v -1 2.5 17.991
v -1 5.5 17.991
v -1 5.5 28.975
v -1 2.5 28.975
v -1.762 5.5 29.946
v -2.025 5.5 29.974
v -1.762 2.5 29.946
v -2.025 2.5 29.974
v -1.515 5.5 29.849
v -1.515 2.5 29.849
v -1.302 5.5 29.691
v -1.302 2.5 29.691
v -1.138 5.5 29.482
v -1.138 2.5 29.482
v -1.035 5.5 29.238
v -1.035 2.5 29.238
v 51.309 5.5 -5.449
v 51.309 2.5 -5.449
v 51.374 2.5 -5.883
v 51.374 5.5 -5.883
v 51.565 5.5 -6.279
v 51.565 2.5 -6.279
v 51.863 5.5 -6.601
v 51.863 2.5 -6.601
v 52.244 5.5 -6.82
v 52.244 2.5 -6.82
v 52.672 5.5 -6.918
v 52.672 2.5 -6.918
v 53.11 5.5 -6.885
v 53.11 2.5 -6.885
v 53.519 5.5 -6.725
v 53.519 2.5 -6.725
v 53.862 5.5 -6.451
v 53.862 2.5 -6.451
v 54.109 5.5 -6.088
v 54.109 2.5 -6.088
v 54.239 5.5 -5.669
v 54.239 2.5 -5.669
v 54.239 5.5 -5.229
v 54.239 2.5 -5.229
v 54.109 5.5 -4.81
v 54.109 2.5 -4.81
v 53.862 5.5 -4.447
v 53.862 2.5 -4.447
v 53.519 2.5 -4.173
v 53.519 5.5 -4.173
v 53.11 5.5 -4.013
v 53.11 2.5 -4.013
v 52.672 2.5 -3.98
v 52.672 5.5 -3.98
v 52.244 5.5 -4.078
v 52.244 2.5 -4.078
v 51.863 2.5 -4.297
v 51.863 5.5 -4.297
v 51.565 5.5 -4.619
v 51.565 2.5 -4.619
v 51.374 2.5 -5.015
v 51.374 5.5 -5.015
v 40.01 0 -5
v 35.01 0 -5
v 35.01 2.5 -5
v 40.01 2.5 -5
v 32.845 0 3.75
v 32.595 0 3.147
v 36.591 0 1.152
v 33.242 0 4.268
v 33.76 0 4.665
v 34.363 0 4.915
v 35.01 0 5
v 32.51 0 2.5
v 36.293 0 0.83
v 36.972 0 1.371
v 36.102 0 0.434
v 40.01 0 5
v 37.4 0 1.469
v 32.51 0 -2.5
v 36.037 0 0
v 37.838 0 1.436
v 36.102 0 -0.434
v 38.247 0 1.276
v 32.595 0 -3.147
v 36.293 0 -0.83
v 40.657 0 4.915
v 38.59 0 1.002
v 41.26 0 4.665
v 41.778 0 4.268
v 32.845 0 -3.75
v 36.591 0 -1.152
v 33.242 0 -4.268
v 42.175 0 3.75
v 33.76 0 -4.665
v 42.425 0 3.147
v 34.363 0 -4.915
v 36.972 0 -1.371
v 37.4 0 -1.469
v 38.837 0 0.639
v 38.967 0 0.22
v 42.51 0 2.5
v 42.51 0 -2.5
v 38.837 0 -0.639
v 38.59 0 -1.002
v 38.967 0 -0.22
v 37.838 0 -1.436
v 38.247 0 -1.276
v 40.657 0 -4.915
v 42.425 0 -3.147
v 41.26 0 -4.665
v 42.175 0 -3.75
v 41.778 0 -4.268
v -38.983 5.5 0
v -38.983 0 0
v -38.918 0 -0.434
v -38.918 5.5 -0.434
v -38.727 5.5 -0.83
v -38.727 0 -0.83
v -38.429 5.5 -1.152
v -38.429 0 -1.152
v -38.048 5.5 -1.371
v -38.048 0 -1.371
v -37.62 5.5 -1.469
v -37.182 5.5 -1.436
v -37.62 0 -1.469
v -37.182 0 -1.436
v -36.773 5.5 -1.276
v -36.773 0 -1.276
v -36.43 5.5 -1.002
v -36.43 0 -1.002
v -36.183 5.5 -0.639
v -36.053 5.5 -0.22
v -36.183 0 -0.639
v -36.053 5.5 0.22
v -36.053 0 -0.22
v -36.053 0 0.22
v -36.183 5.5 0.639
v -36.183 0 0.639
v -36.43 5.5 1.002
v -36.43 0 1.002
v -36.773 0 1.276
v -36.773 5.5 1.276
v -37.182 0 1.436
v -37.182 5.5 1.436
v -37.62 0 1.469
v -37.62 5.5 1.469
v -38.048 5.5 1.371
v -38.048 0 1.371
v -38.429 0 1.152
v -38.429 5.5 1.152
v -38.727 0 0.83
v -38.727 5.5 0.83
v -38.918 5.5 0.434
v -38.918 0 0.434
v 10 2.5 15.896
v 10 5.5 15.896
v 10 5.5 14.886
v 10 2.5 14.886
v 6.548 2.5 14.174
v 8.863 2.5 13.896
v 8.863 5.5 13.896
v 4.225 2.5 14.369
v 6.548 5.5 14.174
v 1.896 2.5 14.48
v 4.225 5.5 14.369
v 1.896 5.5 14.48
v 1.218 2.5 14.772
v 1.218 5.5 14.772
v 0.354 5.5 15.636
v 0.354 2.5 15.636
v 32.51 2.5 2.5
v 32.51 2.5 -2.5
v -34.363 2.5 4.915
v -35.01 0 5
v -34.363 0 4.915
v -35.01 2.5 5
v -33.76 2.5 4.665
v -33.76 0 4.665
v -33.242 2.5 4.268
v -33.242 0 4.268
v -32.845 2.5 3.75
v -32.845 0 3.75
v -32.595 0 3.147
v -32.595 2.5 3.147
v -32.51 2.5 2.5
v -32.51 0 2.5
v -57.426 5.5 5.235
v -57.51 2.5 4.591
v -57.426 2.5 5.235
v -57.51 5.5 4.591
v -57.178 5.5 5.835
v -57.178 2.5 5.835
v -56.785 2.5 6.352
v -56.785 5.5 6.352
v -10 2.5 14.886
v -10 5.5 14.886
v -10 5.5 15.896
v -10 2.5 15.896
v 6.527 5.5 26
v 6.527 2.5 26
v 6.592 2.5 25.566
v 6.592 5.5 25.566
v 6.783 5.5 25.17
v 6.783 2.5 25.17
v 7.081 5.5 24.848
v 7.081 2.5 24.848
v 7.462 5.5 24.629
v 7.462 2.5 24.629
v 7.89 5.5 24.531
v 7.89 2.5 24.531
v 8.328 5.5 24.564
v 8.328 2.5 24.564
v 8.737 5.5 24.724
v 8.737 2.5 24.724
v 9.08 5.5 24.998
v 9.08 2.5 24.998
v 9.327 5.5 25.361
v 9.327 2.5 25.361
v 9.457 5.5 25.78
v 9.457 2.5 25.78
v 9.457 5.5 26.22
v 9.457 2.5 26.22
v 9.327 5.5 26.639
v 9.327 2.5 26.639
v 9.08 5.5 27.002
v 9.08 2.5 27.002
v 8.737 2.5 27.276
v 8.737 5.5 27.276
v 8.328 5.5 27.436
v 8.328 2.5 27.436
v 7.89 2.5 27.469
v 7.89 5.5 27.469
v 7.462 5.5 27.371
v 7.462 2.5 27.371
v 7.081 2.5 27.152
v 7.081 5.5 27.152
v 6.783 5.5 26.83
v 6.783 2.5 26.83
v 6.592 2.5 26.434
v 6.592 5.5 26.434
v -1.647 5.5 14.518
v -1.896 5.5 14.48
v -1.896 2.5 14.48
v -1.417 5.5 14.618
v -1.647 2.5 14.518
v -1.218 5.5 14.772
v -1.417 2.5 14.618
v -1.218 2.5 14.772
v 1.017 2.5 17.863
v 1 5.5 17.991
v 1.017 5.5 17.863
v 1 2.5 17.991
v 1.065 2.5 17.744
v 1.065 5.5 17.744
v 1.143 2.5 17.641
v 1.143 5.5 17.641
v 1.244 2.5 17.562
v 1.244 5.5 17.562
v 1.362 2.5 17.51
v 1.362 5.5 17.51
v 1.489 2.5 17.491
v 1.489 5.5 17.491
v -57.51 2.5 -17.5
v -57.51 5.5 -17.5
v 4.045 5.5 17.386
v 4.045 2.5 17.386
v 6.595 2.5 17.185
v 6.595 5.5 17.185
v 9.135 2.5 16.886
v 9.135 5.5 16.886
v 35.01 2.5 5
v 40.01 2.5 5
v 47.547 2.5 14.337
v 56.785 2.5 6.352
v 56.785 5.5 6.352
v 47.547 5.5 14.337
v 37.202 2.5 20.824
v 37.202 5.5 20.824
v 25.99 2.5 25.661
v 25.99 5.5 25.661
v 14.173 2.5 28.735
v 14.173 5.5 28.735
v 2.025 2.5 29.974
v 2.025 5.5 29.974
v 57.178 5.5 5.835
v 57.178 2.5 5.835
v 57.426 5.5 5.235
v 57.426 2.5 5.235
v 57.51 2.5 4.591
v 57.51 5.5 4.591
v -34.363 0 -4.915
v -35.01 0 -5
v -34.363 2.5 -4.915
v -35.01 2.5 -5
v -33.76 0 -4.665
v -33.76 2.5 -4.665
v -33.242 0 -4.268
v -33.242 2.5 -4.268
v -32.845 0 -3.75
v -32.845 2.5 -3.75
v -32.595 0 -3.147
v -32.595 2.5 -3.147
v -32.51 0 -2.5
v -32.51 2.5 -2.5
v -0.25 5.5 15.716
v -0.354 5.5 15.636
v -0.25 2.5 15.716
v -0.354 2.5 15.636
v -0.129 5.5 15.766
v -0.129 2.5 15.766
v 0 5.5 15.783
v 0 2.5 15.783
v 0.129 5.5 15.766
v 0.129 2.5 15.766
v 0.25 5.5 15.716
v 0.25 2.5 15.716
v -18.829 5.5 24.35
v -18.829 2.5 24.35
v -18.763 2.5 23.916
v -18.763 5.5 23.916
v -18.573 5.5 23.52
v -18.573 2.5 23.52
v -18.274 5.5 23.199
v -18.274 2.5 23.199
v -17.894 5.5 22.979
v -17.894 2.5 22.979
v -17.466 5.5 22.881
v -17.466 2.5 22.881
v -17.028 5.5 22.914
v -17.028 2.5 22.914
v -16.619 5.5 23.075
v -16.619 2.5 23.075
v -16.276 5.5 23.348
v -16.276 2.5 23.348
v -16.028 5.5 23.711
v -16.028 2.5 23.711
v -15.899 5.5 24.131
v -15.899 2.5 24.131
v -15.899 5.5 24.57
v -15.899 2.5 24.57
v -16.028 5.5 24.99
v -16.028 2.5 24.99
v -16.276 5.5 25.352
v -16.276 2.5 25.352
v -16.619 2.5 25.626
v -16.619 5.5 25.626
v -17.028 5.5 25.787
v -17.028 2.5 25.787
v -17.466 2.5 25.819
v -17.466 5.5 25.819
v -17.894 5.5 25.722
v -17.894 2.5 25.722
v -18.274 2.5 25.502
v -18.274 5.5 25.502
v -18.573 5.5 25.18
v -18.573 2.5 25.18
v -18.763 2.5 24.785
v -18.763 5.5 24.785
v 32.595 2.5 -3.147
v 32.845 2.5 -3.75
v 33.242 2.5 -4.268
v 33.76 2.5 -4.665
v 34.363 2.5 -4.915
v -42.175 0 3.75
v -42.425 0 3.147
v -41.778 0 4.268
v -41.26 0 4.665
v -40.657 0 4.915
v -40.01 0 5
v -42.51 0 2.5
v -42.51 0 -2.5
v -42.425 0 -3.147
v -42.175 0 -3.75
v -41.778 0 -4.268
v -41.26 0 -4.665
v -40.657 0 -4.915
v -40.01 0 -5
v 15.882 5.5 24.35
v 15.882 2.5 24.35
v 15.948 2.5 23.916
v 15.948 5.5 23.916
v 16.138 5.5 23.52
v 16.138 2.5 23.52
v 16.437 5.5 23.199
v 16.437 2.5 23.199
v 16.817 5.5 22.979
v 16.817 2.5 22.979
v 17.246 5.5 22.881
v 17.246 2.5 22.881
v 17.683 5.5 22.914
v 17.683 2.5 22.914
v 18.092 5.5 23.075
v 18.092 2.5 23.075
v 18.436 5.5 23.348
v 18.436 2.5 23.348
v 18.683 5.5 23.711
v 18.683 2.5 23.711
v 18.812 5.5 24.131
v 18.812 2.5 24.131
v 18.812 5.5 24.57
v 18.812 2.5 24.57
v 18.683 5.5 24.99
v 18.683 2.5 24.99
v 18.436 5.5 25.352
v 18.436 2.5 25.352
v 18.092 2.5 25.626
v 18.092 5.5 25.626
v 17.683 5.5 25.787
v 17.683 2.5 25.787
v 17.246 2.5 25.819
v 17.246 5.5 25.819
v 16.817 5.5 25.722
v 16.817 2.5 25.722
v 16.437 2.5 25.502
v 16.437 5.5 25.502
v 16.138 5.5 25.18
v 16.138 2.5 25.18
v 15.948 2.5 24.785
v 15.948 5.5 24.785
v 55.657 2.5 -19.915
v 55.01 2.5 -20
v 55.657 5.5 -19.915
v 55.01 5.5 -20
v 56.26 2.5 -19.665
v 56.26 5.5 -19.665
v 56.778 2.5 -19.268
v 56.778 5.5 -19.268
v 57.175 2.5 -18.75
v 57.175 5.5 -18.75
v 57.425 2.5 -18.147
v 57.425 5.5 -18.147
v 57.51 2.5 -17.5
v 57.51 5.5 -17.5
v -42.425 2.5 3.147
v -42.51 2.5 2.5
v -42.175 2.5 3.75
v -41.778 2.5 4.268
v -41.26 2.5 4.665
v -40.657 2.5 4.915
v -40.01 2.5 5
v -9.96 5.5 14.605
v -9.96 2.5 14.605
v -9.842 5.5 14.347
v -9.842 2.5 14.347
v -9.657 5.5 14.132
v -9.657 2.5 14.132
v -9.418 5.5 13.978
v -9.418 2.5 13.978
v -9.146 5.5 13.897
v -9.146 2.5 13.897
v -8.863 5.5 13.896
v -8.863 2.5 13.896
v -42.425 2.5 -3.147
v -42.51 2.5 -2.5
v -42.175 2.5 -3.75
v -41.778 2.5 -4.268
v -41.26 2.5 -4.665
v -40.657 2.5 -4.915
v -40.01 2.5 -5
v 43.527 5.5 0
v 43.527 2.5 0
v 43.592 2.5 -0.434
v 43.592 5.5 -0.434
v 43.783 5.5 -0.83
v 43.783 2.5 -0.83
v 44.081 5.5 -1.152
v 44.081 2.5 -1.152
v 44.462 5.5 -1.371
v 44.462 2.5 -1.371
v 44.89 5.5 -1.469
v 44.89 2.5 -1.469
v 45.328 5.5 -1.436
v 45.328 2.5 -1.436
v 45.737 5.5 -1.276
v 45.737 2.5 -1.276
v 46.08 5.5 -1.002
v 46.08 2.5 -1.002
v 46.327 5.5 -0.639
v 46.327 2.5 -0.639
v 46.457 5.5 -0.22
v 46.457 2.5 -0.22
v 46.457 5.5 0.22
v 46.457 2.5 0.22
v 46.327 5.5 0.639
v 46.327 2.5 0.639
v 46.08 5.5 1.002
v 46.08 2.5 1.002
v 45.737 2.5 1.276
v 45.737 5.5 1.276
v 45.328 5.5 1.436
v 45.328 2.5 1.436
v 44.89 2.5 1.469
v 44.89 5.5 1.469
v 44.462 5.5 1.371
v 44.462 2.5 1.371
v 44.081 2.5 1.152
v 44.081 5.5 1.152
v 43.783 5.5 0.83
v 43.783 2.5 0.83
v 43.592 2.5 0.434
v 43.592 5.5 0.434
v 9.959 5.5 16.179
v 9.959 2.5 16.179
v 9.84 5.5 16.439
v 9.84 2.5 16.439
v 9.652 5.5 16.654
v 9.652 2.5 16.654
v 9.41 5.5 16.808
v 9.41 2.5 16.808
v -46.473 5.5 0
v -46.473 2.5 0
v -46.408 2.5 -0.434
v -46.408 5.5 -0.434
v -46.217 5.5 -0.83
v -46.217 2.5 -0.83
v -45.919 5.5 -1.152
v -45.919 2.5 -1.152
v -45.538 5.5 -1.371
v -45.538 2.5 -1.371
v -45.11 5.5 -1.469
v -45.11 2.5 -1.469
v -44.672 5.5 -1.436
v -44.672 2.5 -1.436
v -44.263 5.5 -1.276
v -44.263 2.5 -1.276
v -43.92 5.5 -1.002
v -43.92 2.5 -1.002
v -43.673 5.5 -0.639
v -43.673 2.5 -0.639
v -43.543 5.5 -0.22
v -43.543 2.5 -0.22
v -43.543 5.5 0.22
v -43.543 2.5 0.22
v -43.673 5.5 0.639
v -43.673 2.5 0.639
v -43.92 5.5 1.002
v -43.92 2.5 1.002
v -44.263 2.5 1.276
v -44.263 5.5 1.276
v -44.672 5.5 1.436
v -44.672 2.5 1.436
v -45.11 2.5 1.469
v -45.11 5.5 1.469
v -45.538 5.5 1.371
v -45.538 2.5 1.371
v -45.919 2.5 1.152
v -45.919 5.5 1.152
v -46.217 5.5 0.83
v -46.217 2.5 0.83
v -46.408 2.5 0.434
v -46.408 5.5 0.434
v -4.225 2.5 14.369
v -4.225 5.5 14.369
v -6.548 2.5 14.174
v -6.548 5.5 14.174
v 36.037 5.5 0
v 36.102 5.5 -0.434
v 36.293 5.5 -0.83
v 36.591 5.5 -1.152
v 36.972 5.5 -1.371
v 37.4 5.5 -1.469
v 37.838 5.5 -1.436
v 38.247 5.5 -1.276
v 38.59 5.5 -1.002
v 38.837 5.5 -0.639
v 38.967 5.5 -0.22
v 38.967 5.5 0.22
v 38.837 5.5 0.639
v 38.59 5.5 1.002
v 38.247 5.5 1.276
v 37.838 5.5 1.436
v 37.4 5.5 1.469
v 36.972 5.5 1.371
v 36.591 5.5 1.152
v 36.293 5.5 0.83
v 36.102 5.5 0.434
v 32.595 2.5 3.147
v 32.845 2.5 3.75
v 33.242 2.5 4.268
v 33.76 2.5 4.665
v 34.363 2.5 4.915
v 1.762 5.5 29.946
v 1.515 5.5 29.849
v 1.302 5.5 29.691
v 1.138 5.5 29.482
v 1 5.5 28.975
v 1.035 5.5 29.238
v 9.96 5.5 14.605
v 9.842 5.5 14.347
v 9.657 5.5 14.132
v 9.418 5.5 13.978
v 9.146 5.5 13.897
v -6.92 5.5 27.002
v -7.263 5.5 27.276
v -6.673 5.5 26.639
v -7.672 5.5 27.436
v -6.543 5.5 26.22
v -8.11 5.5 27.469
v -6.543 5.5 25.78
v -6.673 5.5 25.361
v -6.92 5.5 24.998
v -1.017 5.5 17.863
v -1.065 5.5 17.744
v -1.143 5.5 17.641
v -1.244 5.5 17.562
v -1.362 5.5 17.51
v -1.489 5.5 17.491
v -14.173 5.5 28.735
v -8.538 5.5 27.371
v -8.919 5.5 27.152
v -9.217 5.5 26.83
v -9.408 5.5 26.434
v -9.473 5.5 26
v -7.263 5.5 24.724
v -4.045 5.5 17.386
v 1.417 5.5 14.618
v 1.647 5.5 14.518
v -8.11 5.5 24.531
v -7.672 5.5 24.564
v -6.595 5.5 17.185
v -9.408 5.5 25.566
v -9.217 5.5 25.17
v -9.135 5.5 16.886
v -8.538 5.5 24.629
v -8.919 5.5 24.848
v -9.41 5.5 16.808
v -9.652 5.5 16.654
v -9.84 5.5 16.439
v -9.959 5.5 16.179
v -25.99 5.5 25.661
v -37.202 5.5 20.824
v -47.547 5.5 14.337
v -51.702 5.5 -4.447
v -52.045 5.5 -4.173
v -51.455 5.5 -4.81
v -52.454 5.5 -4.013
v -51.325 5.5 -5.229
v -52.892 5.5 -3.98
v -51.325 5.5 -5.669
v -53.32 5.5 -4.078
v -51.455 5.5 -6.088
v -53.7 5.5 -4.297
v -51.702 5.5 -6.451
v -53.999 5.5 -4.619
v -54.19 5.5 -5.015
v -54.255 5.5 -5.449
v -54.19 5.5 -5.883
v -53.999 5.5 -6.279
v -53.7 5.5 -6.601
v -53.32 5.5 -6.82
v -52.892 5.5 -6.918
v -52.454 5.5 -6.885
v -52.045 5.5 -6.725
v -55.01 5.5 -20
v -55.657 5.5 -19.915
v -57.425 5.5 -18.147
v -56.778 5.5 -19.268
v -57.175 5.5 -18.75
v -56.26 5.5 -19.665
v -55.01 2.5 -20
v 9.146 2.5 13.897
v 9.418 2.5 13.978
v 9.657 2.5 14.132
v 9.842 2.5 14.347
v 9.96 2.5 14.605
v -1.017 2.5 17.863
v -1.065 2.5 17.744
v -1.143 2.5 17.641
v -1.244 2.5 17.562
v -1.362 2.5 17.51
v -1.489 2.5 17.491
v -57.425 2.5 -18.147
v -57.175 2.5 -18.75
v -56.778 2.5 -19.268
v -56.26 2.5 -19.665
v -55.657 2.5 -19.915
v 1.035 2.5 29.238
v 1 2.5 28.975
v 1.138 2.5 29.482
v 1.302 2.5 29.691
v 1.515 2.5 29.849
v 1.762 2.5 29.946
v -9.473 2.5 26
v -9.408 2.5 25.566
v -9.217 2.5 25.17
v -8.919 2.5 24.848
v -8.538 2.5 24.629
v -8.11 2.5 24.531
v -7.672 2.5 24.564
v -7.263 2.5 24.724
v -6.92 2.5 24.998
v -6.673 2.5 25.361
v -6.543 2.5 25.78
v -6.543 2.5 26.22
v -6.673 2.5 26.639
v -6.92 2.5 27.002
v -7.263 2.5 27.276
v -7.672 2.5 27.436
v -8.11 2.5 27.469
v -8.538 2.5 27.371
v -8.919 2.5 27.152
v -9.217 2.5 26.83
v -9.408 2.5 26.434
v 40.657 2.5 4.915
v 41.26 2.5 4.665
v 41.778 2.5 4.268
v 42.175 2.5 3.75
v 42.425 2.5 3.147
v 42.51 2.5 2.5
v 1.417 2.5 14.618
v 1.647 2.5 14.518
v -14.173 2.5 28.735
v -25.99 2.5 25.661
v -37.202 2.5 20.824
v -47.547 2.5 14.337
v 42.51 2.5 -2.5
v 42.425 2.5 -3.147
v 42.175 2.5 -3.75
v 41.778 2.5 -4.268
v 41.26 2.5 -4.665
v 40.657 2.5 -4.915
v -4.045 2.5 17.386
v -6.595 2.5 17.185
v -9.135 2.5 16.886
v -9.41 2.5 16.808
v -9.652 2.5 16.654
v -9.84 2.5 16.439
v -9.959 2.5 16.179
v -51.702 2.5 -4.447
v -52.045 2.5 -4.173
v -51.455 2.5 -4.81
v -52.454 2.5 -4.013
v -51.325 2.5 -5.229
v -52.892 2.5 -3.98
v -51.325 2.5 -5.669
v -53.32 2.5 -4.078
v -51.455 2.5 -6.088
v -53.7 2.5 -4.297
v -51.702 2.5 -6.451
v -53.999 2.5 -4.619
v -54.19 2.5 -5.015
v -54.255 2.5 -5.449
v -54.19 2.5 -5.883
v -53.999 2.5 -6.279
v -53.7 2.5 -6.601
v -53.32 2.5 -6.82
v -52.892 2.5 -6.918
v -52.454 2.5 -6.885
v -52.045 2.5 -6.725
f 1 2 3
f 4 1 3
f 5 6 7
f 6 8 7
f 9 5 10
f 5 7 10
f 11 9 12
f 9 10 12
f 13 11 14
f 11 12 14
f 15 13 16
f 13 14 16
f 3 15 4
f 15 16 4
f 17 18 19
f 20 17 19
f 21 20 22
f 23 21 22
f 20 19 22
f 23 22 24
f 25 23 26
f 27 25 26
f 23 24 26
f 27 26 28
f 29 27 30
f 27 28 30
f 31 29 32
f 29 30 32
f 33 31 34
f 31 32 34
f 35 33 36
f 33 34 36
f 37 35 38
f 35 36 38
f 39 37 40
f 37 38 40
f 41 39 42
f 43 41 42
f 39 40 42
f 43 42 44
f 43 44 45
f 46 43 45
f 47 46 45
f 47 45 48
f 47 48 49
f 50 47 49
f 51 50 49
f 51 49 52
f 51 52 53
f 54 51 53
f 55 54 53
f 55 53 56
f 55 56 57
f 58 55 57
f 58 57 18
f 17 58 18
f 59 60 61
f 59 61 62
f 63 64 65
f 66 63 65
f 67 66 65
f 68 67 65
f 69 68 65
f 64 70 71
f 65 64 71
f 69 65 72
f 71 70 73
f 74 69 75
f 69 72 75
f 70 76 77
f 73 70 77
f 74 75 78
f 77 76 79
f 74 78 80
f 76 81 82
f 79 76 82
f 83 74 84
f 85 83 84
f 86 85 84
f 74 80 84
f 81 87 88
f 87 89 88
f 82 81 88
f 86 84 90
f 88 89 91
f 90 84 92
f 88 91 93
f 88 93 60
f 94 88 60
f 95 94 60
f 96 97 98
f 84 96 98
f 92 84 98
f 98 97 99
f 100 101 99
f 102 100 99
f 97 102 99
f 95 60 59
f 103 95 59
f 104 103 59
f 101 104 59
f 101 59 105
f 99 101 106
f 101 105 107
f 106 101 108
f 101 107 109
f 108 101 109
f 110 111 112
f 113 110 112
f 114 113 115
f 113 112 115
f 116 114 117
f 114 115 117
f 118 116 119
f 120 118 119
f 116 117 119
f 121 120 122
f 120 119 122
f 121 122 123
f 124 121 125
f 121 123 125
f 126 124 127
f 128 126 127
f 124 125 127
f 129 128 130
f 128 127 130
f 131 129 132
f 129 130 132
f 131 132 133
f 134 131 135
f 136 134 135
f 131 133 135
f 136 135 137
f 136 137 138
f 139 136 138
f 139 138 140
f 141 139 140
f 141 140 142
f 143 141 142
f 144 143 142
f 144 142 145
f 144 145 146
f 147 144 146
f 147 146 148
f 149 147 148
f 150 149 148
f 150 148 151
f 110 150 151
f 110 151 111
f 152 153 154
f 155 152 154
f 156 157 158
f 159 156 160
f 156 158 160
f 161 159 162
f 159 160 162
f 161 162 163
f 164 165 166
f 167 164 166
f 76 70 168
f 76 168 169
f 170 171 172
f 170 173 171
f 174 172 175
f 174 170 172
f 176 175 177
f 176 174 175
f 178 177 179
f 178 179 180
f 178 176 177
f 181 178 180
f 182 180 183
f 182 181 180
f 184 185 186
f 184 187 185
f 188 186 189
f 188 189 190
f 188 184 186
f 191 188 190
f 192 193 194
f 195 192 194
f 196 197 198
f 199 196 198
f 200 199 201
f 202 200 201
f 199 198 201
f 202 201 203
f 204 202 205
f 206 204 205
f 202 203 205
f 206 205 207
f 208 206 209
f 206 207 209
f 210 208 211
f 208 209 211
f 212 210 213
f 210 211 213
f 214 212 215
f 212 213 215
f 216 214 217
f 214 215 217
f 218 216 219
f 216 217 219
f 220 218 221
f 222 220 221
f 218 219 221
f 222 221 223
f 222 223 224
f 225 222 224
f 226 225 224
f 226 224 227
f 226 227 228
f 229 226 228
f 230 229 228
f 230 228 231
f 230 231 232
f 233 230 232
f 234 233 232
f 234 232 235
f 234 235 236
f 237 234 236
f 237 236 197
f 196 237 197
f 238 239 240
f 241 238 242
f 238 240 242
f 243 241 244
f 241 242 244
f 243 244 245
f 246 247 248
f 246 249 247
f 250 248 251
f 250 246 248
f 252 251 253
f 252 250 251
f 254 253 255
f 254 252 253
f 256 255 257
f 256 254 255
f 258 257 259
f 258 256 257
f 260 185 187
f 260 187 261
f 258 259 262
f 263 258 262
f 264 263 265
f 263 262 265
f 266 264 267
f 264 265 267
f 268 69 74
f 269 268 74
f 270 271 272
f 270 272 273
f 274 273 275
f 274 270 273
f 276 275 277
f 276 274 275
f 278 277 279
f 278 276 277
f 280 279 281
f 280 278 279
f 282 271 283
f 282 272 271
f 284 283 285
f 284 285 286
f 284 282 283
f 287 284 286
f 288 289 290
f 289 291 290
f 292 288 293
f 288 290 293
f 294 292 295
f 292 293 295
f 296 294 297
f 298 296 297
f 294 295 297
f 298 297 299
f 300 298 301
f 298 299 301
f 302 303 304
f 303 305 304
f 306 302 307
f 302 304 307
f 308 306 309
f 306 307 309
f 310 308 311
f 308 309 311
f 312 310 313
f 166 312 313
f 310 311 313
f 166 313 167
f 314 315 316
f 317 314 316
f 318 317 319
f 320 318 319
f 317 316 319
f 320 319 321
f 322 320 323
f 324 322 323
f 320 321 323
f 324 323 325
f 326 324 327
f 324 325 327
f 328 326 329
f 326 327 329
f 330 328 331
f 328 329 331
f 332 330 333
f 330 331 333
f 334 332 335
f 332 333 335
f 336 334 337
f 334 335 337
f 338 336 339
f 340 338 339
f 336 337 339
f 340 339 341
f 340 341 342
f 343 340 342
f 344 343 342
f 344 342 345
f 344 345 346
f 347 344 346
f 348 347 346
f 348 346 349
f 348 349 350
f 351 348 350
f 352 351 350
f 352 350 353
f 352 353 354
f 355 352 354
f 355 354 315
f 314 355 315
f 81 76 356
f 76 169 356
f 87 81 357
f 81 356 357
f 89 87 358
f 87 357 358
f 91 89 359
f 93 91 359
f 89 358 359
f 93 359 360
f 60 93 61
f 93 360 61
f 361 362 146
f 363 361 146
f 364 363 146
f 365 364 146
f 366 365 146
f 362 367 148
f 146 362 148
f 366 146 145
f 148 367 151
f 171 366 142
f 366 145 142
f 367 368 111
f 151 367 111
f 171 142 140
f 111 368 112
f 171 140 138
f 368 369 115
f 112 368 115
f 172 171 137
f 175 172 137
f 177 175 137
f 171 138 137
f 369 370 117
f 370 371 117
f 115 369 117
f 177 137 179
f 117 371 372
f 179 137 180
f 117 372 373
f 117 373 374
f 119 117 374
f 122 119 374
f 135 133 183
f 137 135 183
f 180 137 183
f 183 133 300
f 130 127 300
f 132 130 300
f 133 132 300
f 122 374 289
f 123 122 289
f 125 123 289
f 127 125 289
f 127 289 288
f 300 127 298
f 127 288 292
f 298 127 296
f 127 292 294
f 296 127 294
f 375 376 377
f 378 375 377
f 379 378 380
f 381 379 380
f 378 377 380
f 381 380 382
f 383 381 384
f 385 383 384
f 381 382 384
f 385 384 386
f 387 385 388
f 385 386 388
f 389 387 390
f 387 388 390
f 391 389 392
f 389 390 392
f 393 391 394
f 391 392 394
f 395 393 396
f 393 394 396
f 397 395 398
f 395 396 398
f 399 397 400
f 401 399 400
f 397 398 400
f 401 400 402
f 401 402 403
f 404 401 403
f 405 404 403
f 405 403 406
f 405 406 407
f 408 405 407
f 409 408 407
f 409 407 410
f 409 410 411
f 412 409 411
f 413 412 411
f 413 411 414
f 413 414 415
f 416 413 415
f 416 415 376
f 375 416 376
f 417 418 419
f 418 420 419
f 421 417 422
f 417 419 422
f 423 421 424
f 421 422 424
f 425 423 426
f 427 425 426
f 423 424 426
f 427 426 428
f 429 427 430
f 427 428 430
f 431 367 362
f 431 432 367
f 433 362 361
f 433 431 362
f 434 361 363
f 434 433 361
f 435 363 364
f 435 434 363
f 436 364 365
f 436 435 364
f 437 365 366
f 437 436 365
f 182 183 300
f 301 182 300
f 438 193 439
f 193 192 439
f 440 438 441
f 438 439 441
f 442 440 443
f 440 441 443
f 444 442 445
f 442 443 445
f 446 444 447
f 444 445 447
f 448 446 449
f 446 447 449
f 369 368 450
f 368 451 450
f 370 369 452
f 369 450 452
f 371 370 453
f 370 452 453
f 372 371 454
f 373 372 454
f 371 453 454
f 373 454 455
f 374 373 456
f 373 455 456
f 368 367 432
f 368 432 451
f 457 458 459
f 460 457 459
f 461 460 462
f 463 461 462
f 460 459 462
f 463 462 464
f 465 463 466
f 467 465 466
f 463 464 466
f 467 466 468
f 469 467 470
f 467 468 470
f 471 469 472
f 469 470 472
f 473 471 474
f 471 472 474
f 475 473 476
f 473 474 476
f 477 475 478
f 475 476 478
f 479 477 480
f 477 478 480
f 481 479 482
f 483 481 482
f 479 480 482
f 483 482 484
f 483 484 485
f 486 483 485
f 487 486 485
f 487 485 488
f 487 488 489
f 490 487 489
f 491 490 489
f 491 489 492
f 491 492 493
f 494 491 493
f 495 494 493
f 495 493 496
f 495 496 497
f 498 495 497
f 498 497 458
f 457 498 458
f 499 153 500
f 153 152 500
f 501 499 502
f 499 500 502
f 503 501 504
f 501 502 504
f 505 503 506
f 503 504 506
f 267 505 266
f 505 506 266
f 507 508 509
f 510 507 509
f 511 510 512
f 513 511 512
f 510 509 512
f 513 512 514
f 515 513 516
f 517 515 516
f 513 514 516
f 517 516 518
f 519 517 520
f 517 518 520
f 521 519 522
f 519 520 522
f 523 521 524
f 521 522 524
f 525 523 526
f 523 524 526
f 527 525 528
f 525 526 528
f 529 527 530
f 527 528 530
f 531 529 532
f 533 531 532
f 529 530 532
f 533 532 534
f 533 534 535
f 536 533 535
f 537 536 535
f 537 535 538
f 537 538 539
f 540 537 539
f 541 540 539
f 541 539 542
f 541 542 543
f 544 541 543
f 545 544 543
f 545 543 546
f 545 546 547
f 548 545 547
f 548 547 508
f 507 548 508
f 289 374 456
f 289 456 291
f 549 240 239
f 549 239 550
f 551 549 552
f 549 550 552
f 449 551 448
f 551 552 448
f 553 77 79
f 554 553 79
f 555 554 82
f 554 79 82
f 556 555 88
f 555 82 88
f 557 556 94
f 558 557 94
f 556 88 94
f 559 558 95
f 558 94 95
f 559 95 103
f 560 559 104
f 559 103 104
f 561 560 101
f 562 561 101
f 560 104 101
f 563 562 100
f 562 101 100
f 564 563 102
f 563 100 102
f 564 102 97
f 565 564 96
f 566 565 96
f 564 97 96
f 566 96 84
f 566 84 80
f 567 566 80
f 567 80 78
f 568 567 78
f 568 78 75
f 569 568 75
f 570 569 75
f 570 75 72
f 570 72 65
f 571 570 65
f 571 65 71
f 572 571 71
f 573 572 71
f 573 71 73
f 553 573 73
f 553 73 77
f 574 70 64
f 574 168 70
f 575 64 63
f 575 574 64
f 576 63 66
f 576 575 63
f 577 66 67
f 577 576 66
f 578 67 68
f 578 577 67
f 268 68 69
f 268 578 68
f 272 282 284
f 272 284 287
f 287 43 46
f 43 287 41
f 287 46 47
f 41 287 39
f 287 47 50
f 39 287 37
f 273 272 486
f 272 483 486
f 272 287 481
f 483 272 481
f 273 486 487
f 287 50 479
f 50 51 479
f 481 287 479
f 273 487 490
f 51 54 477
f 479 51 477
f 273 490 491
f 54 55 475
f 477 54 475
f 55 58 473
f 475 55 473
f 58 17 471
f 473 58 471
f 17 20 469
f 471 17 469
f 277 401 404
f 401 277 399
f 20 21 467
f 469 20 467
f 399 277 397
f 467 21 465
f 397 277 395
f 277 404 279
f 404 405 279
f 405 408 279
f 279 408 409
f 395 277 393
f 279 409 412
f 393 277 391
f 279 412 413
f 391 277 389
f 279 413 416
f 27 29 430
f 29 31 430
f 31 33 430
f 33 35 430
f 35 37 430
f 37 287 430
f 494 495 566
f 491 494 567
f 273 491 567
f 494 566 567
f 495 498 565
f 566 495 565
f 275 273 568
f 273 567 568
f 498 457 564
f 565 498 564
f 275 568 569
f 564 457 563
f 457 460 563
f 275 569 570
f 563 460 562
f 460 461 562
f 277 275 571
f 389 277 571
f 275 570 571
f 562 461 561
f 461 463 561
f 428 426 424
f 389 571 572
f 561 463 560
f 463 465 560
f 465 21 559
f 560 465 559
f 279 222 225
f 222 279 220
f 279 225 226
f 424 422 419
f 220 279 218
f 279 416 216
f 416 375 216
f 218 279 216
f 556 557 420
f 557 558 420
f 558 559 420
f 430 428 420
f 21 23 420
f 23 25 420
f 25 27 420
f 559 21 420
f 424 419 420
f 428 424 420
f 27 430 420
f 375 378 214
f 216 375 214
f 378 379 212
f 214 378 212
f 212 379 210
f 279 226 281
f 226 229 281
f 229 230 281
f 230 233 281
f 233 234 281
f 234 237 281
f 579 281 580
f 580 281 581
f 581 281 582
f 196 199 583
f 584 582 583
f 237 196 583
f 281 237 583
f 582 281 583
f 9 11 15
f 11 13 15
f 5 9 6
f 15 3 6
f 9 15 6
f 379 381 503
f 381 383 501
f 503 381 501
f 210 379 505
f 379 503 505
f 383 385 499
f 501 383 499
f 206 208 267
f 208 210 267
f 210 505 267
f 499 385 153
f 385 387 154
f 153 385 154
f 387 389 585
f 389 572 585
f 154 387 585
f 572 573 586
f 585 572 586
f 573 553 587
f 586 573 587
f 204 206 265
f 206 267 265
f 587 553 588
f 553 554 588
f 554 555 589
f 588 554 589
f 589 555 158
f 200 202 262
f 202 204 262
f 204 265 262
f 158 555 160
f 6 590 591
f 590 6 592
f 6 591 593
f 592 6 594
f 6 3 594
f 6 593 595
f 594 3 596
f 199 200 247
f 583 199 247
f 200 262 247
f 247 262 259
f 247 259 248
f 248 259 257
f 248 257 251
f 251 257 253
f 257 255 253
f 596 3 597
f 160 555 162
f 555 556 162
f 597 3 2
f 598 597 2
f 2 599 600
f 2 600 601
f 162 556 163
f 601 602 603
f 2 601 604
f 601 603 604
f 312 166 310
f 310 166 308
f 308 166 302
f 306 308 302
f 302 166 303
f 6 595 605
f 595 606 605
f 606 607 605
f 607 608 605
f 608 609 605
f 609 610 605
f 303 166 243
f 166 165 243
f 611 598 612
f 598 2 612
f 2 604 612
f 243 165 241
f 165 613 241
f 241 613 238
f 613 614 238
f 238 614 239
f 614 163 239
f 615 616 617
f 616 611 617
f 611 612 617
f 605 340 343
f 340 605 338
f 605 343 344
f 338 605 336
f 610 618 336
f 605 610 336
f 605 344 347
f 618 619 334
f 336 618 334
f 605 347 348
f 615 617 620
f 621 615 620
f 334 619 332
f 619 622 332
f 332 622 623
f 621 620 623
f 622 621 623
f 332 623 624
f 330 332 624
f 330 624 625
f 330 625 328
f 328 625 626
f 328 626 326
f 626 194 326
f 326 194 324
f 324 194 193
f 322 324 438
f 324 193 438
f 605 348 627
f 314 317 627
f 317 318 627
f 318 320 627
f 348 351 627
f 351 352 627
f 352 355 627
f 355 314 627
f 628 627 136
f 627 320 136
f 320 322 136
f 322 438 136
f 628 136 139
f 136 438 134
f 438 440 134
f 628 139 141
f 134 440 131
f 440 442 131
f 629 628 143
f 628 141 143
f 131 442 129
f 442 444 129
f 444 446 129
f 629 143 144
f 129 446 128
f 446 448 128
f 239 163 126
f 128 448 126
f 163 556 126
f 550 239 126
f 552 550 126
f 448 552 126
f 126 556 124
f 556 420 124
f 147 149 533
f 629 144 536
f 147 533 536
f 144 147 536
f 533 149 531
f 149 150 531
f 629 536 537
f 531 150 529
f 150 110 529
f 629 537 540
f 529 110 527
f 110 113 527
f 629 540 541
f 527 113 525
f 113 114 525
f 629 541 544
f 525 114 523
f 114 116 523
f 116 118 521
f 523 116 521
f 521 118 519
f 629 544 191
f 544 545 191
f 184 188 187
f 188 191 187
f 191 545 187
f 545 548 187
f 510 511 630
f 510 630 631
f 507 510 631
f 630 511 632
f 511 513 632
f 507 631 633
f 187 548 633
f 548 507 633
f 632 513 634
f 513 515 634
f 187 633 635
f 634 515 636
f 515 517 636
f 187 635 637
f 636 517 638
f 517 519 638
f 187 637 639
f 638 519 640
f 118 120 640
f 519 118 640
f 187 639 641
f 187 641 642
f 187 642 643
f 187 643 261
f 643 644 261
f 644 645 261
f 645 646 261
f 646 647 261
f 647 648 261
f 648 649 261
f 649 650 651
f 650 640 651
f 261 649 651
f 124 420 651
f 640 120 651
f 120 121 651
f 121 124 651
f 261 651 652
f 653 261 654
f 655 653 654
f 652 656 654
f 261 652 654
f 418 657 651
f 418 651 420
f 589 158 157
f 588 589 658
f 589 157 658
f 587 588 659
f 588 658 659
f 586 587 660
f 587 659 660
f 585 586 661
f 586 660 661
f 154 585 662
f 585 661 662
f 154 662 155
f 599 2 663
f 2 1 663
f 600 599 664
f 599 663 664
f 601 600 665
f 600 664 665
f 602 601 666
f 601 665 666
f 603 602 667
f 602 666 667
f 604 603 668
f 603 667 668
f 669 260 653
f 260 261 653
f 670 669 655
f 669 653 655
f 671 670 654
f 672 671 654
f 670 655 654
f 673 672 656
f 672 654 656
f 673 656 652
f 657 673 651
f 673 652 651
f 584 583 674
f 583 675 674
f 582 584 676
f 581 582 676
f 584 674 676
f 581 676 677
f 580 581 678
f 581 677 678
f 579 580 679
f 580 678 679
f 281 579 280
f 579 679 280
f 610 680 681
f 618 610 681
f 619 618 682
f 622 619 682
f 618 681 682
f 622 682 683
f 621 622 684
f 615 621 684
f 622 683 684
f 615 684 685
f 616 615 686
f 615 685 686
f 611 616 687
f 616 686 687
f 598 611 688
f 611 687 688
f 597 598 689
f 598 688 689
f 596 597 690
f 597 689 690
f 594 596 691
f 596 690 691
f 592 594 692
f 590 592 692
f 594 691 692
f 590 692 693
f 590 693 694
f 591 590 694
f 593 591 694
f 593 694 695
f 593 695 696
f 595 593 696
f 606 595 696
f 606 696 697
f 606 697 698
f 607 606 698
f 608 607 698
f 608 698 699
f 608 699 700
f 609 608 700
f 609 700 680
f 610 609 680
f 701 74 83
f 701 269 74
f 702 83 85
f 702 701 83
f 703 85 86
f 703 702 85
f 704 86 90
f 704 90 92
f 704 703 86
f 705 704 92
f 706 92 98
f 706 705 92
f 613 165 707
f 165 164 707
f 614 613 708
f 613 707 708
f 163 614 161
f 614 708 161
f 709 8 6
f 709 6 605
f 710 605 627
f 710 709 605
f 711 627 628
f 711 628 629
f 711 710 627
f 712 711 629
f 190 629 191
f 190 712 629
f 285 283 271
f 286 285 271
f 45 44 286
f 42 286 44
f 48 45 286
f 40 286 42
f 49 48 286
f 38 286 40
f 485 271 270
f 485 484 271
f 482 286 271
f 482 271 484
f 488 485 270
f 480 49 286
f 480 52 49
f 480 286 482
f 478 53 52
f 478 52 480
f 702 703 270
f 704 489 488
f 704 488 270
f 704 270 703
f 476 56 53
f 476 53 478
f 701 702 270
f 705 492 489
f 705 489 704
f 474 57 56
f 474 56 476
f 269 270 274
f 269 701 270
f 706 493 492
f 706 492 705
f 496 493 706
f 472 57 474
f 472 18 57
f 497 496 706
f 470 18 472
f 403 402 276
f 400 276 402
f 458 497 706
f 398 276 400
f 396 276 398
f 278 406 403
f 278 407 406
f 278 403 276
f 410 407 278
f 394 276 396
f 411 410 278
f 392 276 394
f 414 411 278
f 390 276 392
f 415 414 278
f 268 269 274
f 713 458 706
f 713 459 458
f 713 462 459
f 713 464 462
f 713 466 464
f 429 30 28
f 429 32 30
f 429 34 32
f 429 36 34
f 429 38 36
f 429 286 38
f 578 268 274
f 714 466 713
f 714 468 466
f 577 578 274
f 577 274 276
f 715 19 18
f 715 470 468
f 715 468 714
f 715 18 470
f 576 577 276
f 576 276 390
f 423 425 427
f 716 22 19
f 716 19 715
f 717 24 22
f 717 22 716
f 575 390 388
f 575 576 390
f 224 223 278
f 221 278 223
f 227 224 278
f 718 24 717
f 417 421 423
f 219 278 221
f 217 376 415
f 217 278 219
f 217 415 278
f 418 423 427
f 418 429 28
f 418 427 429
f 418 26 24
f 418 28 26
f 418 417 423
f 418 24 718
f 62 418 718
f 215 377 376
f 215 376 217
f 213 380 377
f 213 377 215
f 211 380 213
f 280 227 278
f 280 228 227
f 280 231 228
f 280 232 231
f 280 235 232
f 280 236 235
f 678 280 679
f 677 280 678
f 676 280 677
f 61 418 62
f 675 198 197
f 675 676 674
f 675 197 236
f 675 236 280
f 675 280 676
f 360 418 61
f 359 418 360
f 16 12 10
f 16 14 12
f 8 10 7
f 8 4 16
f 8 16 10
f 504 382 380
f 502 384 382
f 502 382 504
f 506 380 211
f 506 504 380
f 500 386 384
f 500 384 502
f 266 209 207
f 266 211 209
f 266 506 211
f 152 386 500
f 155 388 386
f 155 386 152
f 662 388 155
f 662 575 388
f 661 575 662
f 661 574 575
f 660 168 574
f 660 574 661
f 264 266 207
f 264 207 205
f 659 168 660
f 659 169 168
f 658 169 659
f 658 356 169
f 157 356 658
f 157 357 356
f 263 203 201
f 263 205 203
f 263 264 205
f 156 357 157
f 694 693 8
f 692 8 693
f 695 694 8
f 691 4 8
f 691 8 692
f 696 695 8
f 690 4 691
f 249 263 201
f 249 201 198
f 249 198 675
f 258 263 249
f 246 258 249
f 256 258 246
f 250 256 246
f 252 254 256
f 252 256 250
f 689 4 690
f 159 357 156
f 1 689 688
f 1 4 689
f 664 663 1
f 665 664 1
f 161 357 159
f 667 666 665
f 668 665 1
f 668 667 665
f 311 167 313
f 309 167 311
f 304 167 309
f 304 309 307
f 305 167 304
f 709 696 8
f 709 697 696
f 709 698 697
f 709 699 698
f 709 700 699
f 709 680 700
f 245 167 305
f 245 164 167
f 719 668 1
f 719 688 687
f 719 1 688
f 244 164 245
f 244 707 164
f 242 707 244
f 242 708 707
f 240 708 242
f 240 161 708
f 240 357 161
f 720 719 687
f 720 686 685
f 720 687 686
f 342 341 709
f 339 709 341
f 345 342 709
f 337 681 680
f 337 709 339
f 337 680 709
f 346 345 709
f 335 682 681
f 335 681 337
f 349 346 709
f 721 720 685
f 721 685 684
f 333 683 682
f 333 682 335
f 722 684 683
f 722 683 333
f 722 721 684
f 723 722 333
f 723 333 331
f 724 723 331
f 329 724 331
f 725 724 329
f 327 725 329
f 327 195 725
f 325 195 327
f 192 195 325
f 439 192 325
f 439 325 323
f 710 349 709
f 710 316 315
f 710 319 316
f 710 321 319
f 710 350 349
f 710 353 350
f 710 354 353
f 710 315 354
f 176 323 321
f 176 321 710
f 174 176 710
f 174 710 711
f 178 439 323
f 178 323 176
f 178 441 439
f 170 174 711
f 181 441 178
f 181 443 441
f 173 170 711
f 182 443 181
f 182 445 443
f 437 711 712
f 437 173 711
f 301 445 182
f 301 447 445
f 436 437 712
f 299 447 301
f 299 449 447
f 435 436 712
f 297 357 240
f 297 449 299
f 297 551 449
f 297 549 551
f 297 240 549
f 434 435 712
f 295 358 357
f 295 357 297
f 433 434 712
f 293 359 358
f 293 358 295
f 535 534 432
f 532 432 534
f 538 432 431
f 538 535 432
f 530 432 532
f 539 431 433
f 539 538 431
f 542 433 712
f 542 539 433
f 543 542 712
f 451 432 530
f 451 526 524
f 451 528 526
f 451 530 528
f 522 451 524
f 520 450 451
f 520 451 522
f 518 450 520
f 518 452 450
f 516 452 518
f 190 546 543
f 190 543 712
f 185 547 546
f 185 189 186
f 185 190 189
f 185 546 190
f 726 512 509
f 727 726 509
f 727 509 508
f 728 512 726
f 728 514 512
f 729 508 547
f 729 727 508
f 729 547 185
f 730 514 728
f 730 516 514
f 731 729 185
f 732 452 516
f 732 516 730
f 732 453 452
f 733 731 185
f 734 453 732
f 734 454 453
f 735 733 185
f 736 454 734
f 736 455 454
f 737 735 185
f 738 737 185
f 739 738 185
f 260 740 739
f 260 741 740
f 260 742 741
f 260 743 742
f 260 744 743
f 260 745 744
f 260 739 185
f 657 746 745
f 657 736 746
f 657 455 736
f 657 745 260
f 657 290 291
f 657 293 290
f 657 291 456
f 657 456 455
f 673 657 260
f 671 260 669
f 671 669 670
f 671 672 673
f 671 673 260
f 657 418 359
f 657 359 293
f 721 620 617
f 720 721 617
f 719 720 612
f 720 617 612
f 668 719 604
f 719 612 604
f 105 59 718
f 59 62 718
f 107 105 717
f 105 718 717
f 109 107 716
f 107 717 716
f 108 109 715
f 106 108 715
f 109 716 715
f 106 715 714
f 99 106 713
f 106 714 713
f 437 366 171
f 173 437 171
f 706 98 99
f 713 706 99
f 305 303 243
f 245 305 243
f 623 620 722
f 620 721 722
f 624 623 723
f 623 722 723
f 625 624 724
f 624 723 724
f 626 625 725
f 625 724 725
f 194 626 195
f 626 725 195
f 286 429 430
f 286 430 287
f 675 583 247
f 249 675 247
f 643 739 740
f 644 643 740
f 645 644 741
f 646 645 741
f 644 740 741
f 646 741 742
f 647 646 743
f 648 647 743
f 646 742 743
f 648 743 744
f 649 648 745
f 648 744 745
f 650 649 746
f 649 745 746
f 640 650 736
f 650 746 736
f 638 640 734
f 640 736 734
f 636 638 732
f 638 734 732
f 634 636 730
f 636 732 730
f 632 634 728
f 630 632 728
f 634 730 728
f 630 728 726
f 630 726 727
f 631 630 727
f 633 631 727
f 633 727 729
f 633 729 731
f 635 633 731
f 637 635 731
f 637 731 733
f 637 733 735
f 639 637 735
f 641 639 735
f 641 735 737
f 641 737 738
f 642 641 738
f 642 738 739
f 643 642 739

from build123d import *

# Parameters (mm, degrees)
SKETCH1_W             = 10
SKETCH1_H             = 10
BOSS_EXTRUDE1_DEPTH   = 2.5
BOSS_EXTRUDE1_2_DEPTH = 2.5
BOSS_EXTRUDE2_DEPTH   = 3
F_2_CLEARANCE_HOLE1_D = 2.9464
FILLET1_R             = 2.5
F_2_CLEARANCE_HOLE2_D = 2.9464
CUT_EXTRUDE1_DEPTH    = 66.097235732
FILLET2_R             = 1
FILLET3_R             = 0.5


with BuildPart() as part:
    # Sketch1 → Boss-Extrude1 (new body)
    with BuildSketch(Plane(origin=(0, 0, 0), x_dir=(1, 0, 0), z_dir=(0, 1, 0))):
        with Locations((-37.51, 0)):
            Rectangle(SKETCH1_W, SKETCH1_H)
    extrude(amount=BOSS_EXTRUDE1_DEPTH)



with BuildPart() as body_2:
    # Sketch1 → Boss-Extrude1 2 (new body)
    with BuildSketch(Plane(origin=(0, 0, 0), x_dir=(1, 0, 0), z_dir=(0, 1, 0))):
        with Locations((37.51, 0)):
            Rectangle(SKETCH1_W, SKETCH1_H)
    extrude(amount=BOSS_EXTRUDE1_2_DEPTH)


with BuildPart() as part_1:
    add(part.part)

    add(body_2.part)  # Boss-Extrude2 merges body 2
    # Sketch2 → Boss-Extrude2 (add)
    with BuildSketch(Plane(origin=(0, 2.5, 0), x_dir=(1, 0, 0), z_dir=(0, 1, 0))):
        with BuildLine():
            Line((-57.51, -5.611149062), (-57.51, 20))
            Line((-57.51, 20), (57.51, 20))
            Line((57.51, 20), (57.51, -5.611149062))
            ThreePointArc((57.51, -5.611149062), (0, -30), (-57.51, -5.611149062))
        make_face()
    extrude(amount=BOSS_EXTRUDE2_DEPTH)

    # #2 Clearance Hole1 (through all)
    with Locations(Plane(origin=(0, 5.5, 0), x_dir=(1, 0, 0), z_dir=(0, 1, 0))):
        with Locations((17.355673654, -24.350342312), (-17.355673654, -24.350342312), (-8, -26), (-52.781944421, 5.448976145), (-45, 0), (45, 0), (52.781944421, 5.448976145), (8, -26)):
            Hole(F_2_CLEARANCE_HOLE1_D / 2)

    # Fillet1
    fillet1_edges = [part_1.edges().sort_by_distance(p)[0] for p in [
        (-57.51, 4, 5.611149062),
        (57.51, 4, 5.611149062),
        (57.51, 4, -20),
        (-57.51, 4, -20),
        (32.51, 1.25, -5),
        (32.51, 1.25, 5),
        (42.51, 1.25, 5),
        (42.51, 1.25, -5),
        (-32.51, 1.25, 5),
        (-42.51, 1.25, 5),
        (-42.51, 1.25, -5),
        (-32.51, 1.25, -5),
    ]]
    fillet(fillet1_edges, radius=FILLET1_R)

    # #2 Clearance Hole2 (through all)
    with Locations(Plane(origin=(0, 5.5, 0), x_dir=(1, 0, 0), z_dir=(0, 1, 0))):
        with Locations((-37.51, 0), (37.51, 0)):
            Hole(F_2_CLEARANCE_HOLE2_D / 2)

    # Sketch7 → Cut-Extrude1 (cut, through all)
    with BuildSketch(Plane(origin=(0, 5.5, 0), x_dir=(1, 0, 0), z_dir=(0, 1, 0))):
        with BuildLine():
            Line((-1, -17.5), (-1, -29.993749756))
            Line((-1, -29.993749756), (0, -30))
            Line((0, -30), (1, -29.993749756))
            Line((1, -29.993749756), (1, -17.5))
            ThreePointArc((1, -17.5), (5.512342988, -17.281974367), (10, -16.762639253))
            Line((10, -16.762639253), (10, -13.727588672))
            ThreePointArc((10, -13.727588672), (5.762621308, -14.249496135), (1.5, -14.489964785))
            Line((1.5, -14.489964785), (0, -15.989964785))
            Line((0, -15.989964785), (-1.5, -14.489964785))
            ThreePointArc((-1.5, -14.489964785), (-5.762621308, -14.249496135), (-10, -13.727588672))
            Line((-10, -13.727588672), (-10, -16.762639253))
            ThreePointArc((-10, -16.762639253), (-5.512342988, -17.281974367), (-1, -17.5))
        make_face()
    extrude(amount=-CUT_EXTRUDE1_DEPTH, mode=Mode.SUBTRACT)


with BuildPart() as cut_extrude1_kept_piece:
    # of the separate pieces the step leaves, the one the design keeps (cut_extrude1_pieces_kept)
    add(part_1.part.solids().sort_by_distance((-57.51, 2.5, 4.590749216))[0])

    # Fillet2
    fillet2_edges = [cut_extrude1_kept_piece.edges().sort_by_distance(p)[0] for p in [
        (10, 4, 13.727588672),
        (10, 4, 16.762639253),
        (1, 4, 29.993749756),
        (-1, 4, 29.993749756),
        (-10, 4, 16.762639253),
        (-1.5, 4, 14.489964785),
        (1.5, 4, 14.489964785),
        (-10, 4, 13.727588672),
    ]]
    fillet(fillet2_edges, radius=FILLET2_R)

    # Fillet3
    fillet3_edges = [cut_extrude1_kept_piece.edges().sort_by_distance(p)[0] for p in [
        (1, 4, 17.5),
        (-1, 4, 17.5),
        (0, 4, 15.989964785),
    ]]
    fillet(fillet3_edges, radius=FILLET3_R)


solid = cut_extrude1_kept_piece.part
